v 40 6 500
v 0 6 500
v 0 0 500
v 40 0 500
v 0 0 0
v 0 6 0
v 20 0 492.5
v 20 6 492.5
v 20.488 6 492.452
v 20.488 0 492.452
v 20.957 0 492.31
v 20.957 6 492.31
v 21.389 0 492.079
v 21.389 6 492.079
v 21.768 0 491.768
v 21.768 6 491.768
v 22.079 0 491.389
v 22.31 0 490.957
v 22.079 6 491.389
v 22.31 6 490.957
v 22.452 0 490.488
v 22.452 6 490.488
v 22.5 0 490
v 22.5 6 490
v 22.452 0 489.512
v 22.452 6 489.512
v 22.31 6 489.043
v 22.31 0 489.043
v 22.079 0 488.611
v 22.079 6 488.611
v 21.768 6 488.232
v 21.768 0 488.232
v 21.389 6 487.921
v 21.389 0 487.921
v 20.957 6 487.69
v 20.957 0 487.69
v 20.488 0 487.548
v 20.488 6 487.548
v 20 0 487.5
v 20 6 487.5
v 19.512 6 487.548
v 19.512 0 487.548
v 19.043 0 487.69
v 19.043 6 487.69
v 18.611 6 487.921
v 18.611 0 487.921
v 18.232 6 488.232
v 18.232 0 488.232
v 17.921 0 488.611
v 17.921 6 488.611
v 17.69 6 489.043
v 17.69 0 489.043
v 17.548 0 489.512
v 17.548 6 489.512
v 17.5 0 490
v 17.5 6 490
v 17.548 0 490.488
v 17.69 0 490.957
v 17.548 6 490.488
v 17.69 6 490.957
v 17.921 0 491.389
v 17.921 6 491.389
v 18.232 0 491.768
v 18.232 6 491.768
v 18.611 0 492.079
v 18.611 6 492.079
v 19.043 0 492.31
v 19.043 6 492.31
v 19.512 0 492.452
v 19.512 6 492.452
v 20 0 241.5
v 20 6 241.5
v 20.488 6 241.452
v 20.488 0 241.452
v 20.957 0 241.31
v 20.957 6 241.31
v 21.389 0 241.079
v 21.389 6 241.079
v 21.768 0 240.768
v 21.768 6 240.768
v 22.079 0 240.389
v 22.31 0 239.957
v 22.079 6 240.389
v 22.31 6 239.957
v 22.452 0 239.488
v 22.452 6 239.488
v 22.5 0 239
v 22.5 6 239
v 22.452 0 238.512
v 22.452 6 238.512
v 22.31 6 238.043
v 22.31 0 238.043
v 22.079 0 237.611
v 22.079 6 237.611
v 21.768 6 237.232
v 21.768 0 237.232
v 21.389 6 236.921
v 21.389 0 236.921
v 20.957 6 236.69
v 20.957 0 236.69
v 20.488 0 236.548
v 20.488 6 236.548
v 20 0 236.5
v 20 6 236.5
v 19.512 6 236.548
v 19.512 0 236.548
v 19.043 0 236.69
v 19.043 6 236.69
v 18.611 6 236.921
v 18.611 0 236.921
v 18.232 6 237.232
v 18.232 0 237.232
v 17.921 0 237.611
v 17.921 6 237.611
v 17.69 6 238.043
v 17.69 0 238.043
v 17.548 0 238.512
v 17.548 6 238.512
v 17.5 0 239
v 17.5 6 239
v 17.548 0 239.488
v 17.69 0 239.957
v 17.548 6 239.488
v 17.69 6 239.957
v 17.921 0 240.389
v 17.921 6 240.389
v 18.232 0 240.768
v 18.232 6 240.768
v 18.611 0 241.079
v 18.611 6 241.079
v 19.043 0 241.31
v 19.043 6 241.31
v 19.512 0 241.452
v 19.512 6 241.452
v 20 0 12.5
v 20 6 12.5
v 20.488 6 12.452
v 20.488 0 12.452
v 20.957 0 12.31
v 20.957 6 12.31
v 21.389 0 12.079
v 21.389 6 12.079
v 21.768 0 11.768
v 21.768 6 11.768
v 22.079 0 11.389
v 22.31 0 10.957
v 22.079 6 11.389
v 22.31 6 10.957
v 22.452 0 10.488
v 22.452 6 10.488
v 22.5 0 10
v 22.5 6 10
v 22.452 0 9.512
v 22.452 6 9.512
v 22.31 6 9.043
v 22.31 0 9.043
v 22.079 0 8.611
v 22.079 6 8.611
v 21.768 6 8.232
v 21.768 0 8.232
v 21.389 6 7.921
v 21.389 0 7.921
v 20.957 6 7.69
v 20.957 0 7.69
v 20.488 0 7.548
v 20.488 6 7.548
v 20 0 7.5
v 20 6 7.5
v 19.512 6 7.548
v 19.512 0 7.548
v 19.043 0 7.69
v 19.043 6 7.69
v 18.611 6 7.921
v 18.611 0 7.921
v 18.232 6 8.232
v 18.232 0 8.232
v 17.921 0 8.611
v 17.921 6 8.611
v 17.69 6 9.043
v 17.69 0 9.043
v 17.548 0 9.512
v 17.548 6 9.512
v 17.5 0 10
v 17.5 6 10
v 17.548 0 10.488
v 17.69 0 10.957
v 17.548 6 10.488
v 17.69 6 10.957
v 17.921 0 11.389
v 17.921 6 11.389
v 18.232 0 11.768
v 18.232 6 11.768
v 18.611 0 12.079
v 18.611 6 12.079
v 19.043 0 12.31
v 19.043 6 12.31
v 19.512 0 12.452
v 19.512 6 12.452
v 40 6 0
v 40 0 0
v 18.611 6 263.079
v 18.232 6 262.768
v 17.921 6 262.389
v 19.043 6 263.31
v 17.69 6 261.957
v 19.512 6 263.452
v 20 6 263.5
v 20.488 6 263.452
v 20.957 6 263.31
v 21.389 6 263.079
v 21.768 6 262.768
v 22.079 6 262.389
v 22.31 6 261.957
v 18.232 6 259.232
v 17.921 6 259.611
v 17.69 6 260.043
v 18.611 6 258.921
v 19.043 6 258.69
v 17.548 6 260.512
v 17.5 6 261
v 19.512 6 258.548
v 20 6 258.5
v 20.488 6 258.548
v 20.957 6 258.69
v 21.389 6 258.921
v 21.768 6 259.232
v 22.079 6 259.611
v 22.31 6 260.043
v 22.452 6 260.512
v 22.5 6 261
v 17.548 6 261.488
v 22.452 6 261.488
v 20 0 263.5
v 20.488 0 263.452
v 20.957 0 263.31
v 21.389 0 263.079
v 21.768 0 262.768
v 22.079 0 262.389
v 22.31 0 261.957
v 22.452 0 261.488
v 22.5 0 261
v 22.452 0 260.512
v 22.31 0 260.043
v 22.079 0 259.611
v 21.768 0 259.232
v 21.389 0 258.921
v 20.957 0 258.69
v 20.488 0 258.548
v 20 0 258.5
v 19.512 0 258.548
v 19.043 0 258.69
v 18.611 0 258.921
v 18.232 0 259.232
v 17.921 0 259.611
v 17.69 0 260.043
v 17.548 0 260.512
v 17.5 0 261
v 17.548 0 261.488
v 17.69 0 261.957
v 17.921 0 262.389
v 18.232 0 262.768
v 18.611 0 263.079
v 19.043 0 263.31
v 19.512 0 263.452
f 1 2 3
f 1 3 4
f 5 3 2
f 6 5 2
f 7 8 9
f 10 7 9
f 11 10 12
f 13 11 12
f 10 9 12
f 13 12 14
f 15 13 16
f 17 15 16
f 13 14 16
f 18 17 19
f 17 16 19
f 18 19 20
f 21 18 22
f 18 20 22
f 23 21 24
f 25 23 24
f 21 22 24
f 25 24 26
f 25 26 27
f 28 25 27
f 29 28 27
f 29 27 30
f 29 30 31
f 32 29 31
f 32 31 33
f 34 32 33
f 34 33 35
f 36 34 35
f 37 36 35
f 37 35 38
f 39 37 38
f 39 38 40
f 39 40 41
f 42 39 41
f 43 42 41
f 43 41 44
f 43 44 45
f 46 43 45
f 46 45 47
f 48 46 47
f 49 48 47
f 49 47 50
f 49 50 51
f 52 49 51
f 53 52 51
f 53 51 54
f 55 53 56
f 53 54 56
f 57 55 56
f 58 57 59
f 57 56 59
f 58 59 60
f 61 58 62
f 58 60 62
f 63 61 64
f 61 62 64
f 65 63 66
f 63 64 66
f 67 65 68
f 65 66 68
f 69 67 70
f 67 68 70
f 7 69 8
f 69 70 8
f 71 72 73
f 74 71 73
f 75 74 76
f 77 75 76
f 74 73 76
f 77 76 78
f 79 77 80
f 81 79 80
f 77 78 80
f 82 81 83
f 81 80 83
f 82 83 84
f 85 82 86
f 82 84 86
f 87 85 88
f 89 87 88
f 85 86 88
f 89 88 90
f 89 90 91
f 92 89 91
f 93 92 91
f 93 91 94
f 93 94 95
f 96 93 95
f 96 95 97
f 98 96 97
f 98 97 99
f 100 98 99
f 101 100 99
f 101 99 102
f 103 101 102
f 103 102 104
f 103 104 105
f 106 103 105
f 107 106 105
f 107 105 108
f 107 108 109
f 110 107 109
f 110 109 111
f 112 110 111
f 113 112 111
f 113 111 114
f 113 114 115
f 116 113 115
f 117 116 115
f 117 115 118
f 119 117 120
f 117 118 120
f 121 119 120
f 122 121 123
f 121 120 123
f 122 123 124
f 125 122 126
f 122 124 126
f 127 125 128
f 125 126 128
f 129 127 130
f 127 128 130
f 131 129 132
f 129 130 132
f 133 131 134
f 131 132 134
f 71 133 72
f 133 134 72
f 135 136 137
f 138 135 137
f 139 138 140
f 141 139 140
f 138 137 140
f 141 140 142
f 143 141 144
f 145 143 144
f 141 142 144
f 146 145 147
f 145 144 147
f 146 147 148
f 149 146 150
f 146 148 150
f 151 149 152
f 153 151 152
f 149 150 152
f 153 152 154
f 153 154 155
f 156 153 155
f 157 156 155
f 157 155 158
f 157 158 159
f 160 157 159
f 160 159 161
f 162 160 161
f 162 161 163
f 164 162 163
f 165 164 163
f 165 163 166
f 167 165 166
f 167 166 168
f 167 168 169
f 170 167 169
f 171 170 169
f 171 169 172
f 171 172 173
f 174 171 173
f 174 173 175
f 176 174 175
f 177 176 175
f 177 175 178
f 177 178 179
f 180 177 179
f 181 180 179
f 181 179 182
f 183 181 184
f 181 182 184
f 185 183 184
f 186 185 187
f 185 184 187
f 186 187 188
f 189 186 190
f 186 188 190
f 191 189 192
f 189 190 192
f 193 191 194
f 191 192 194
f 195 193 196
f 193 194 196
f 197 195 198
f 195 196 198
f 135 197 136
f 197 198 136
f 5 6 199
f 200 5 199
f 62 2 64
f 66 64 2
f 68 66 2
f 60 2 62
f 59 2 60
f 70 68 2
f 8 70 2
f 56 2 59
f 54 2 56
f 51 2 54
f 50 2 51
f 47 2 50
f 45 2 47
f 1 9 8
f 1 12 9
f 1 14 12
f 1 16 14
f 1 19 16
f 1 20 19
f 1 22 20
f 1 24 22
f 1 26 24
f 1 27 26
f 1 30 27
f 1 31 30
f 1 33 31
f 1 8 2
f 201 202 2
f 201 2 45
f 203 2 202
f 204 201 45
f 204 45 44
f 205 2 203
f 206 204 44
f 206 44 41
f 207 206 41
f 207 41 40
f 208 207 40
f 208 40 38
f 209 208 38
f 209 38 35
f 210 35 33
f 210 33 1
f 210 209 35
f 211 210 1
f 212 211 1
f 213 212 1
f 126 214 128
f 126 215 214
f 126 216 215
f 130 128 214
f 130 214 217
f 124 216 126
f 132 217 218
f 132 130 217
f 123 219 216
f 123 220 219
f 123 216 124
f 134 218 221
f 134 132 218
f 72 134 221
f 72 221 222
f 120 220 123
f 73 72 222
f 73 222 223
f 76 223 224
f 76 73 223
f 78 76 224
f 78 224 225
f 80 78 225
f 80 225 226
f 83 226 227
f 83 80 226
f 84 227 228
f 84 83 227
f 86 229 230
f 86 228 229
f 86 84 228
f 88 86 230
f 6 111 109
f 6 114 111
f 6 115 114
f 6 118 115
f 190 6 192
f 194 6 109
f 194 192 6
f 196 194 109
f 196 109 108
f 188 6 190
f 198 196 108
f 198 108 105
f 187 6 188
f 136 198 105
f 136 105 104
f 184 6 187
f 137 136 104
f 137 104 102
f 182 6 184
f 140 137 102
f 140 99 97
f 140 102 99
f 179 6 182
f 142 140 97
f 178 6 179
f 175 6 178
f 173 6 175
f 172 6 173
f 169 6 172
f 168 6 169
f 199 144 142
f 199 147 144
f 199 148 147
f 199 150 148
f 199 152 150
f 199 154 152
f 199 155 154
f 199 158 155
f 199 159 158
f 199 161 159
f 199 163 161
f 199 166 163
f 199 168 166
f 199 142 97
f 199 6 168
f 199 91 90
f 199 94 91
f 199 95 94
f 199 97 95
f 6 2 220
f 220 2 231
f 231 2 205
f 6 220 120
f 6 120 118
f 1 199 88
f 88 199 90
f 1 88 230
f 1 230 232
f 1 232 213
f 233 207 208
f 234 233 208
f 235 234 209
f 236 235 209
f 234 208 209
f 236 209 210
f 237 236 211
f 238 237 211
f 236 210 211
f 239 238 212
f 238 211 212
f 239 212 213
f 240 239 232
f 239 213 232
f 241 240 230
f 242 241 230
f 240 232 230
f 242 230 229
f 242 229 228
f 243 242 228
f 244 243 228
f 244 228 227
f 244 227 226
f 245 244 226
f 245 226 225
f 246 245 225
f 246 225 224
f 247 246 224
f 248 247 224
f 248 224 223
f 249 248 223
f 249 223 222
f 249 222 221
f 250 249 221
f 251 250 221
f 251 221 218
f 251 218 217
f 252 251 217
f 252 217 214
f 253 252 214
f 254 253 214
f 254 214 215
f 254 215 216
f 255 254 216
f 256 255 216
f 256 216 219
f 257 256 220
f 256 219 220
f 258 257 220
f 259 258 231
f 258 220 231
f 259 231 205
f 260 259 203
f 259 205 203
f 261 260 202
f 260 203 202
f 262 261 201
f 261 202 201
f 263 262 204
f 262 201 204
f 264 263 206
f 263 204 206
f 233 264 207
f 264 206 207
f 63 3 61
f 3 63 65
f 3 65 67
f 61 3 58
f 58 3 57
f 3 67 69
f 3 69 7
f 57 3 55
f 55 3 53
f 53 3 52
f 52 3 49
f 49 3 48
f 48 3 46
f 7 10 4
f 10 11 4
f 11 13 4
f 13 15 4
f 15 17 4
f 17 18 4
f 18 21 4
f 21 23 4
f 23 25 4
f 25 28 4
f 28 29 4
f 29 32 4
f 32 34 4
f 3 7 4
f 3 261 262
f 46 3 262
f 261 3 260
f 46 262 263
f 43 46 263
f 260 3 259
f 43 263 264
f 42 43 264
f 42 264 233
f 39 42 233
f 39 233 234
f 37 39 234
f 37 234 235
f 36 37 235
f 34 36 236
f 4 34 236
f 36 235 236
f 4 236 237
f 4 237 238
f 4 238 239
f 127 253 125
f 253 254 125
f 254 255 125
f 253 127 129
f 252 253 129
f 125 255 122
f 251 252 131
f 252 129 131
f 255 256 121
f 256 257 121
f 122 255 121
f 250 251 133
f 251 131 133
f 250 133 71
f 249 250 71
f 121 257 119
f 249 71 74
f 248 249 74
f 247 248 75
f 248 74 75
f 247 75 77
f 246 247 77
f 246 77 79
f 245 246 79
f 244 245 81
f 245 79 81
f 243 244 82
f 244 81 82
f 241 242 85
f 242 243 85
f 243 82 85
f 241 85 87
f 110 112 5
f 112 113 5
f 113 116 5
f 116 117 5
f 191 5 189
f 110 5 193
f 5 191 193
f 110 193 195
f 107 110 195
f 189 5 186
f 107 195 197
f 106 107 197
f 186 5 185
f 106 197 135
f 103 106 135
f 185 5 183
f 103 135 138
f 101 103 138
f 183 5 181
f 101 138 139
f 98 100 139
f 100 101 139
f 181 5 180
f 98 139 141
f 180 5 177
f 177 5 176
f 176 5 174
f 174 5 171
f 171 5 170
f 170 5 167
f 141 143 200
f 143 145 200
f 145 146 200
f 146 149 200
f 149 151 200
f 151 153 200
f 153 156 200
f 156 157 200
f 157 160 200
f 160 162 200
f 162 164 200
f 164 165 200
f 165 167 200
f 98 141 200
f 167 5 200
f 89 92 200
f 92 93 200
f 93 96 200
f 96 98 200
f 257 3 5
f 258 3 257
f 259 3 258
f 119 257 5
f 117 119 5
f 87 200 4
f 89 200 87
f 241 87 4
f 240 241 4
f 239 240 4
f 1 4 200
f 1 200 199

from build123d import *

# Parameters (mm, degrees)
SKETCH1_W           = 40
SKETCH1_H           = 6
BOSS_EXTRUDE1_DEPTH = 500
SKETCH2_R           = 2.5
CUT_EXTRUDE1_DEPTH  = 10
LPATTERN1_COUNT     = 2
LPATTERN1_PITCH     = 480
SKETCH3_R           = 2.5
CUT_EXTRUDE2_DEPTH  = 10
LPATTERN2_COUNT     = 2
LPATTERN2_PITCH     = 22


with BuildPart() as part:
    # Sketch1 → Boss-Extrude1 (new body)
    with BuildSketch(Plane.XY):
        with Locations((20, 3)):
            Rectangle(SKETCH1_W, SKETCH1_H)
    extrude(amount=BOSS_EXTRUDE1_DEPTH)

    # Sketch2 → Cut-Extrude1 (cut)
    with BuildSketch(Plane(origin=(0, 6, 0), x_dir=(1, 0, 0), z_dir=(0, 1, 0))):
        with Locations(Location((20, -10, 0), (0, 0, 270))):
            Circle(SKETCH2_R)
    cut_extrude1 = extrude(amount=-CUT_EXTRUDE1_DEPTH, mode=Mode.SUBTRACT)

    # LPattern1: Cut-Extrude1 ×2
    with Locations(*[(0, 0, i * LPATTERN1_PITCH) for i in range(1, LPATTERN1_COUNT)]):
        add(cut_extrude1, mode=Mode.SUBTRACT)

    # Sketch3 → Cut-Extrude2 (cut)
    with BuildSketch(Plane(origin=(0, 6, 0), x_dir=(1, 0, 0), z_dir=(0, 1, 0))):
        with Locations(Location((20, -239, 0), (0, 0, 270))):
            Circle(SKETCH3_R)
    cut_extrude2 = extrude(amount=-CUT_EXTRUDE2_DEPTH, mode=Mode.SUBTRACT)

    # LPattern2: Cut-Extrude2 ×2
    with Locations(*[(0, 0, i * LPATTERN2_PITCH) for i in range(1, LPATTERN2_COUNT)]):
        add(cut_extrude2, mode=Mode.SUBTRACT)


solid = part.part
